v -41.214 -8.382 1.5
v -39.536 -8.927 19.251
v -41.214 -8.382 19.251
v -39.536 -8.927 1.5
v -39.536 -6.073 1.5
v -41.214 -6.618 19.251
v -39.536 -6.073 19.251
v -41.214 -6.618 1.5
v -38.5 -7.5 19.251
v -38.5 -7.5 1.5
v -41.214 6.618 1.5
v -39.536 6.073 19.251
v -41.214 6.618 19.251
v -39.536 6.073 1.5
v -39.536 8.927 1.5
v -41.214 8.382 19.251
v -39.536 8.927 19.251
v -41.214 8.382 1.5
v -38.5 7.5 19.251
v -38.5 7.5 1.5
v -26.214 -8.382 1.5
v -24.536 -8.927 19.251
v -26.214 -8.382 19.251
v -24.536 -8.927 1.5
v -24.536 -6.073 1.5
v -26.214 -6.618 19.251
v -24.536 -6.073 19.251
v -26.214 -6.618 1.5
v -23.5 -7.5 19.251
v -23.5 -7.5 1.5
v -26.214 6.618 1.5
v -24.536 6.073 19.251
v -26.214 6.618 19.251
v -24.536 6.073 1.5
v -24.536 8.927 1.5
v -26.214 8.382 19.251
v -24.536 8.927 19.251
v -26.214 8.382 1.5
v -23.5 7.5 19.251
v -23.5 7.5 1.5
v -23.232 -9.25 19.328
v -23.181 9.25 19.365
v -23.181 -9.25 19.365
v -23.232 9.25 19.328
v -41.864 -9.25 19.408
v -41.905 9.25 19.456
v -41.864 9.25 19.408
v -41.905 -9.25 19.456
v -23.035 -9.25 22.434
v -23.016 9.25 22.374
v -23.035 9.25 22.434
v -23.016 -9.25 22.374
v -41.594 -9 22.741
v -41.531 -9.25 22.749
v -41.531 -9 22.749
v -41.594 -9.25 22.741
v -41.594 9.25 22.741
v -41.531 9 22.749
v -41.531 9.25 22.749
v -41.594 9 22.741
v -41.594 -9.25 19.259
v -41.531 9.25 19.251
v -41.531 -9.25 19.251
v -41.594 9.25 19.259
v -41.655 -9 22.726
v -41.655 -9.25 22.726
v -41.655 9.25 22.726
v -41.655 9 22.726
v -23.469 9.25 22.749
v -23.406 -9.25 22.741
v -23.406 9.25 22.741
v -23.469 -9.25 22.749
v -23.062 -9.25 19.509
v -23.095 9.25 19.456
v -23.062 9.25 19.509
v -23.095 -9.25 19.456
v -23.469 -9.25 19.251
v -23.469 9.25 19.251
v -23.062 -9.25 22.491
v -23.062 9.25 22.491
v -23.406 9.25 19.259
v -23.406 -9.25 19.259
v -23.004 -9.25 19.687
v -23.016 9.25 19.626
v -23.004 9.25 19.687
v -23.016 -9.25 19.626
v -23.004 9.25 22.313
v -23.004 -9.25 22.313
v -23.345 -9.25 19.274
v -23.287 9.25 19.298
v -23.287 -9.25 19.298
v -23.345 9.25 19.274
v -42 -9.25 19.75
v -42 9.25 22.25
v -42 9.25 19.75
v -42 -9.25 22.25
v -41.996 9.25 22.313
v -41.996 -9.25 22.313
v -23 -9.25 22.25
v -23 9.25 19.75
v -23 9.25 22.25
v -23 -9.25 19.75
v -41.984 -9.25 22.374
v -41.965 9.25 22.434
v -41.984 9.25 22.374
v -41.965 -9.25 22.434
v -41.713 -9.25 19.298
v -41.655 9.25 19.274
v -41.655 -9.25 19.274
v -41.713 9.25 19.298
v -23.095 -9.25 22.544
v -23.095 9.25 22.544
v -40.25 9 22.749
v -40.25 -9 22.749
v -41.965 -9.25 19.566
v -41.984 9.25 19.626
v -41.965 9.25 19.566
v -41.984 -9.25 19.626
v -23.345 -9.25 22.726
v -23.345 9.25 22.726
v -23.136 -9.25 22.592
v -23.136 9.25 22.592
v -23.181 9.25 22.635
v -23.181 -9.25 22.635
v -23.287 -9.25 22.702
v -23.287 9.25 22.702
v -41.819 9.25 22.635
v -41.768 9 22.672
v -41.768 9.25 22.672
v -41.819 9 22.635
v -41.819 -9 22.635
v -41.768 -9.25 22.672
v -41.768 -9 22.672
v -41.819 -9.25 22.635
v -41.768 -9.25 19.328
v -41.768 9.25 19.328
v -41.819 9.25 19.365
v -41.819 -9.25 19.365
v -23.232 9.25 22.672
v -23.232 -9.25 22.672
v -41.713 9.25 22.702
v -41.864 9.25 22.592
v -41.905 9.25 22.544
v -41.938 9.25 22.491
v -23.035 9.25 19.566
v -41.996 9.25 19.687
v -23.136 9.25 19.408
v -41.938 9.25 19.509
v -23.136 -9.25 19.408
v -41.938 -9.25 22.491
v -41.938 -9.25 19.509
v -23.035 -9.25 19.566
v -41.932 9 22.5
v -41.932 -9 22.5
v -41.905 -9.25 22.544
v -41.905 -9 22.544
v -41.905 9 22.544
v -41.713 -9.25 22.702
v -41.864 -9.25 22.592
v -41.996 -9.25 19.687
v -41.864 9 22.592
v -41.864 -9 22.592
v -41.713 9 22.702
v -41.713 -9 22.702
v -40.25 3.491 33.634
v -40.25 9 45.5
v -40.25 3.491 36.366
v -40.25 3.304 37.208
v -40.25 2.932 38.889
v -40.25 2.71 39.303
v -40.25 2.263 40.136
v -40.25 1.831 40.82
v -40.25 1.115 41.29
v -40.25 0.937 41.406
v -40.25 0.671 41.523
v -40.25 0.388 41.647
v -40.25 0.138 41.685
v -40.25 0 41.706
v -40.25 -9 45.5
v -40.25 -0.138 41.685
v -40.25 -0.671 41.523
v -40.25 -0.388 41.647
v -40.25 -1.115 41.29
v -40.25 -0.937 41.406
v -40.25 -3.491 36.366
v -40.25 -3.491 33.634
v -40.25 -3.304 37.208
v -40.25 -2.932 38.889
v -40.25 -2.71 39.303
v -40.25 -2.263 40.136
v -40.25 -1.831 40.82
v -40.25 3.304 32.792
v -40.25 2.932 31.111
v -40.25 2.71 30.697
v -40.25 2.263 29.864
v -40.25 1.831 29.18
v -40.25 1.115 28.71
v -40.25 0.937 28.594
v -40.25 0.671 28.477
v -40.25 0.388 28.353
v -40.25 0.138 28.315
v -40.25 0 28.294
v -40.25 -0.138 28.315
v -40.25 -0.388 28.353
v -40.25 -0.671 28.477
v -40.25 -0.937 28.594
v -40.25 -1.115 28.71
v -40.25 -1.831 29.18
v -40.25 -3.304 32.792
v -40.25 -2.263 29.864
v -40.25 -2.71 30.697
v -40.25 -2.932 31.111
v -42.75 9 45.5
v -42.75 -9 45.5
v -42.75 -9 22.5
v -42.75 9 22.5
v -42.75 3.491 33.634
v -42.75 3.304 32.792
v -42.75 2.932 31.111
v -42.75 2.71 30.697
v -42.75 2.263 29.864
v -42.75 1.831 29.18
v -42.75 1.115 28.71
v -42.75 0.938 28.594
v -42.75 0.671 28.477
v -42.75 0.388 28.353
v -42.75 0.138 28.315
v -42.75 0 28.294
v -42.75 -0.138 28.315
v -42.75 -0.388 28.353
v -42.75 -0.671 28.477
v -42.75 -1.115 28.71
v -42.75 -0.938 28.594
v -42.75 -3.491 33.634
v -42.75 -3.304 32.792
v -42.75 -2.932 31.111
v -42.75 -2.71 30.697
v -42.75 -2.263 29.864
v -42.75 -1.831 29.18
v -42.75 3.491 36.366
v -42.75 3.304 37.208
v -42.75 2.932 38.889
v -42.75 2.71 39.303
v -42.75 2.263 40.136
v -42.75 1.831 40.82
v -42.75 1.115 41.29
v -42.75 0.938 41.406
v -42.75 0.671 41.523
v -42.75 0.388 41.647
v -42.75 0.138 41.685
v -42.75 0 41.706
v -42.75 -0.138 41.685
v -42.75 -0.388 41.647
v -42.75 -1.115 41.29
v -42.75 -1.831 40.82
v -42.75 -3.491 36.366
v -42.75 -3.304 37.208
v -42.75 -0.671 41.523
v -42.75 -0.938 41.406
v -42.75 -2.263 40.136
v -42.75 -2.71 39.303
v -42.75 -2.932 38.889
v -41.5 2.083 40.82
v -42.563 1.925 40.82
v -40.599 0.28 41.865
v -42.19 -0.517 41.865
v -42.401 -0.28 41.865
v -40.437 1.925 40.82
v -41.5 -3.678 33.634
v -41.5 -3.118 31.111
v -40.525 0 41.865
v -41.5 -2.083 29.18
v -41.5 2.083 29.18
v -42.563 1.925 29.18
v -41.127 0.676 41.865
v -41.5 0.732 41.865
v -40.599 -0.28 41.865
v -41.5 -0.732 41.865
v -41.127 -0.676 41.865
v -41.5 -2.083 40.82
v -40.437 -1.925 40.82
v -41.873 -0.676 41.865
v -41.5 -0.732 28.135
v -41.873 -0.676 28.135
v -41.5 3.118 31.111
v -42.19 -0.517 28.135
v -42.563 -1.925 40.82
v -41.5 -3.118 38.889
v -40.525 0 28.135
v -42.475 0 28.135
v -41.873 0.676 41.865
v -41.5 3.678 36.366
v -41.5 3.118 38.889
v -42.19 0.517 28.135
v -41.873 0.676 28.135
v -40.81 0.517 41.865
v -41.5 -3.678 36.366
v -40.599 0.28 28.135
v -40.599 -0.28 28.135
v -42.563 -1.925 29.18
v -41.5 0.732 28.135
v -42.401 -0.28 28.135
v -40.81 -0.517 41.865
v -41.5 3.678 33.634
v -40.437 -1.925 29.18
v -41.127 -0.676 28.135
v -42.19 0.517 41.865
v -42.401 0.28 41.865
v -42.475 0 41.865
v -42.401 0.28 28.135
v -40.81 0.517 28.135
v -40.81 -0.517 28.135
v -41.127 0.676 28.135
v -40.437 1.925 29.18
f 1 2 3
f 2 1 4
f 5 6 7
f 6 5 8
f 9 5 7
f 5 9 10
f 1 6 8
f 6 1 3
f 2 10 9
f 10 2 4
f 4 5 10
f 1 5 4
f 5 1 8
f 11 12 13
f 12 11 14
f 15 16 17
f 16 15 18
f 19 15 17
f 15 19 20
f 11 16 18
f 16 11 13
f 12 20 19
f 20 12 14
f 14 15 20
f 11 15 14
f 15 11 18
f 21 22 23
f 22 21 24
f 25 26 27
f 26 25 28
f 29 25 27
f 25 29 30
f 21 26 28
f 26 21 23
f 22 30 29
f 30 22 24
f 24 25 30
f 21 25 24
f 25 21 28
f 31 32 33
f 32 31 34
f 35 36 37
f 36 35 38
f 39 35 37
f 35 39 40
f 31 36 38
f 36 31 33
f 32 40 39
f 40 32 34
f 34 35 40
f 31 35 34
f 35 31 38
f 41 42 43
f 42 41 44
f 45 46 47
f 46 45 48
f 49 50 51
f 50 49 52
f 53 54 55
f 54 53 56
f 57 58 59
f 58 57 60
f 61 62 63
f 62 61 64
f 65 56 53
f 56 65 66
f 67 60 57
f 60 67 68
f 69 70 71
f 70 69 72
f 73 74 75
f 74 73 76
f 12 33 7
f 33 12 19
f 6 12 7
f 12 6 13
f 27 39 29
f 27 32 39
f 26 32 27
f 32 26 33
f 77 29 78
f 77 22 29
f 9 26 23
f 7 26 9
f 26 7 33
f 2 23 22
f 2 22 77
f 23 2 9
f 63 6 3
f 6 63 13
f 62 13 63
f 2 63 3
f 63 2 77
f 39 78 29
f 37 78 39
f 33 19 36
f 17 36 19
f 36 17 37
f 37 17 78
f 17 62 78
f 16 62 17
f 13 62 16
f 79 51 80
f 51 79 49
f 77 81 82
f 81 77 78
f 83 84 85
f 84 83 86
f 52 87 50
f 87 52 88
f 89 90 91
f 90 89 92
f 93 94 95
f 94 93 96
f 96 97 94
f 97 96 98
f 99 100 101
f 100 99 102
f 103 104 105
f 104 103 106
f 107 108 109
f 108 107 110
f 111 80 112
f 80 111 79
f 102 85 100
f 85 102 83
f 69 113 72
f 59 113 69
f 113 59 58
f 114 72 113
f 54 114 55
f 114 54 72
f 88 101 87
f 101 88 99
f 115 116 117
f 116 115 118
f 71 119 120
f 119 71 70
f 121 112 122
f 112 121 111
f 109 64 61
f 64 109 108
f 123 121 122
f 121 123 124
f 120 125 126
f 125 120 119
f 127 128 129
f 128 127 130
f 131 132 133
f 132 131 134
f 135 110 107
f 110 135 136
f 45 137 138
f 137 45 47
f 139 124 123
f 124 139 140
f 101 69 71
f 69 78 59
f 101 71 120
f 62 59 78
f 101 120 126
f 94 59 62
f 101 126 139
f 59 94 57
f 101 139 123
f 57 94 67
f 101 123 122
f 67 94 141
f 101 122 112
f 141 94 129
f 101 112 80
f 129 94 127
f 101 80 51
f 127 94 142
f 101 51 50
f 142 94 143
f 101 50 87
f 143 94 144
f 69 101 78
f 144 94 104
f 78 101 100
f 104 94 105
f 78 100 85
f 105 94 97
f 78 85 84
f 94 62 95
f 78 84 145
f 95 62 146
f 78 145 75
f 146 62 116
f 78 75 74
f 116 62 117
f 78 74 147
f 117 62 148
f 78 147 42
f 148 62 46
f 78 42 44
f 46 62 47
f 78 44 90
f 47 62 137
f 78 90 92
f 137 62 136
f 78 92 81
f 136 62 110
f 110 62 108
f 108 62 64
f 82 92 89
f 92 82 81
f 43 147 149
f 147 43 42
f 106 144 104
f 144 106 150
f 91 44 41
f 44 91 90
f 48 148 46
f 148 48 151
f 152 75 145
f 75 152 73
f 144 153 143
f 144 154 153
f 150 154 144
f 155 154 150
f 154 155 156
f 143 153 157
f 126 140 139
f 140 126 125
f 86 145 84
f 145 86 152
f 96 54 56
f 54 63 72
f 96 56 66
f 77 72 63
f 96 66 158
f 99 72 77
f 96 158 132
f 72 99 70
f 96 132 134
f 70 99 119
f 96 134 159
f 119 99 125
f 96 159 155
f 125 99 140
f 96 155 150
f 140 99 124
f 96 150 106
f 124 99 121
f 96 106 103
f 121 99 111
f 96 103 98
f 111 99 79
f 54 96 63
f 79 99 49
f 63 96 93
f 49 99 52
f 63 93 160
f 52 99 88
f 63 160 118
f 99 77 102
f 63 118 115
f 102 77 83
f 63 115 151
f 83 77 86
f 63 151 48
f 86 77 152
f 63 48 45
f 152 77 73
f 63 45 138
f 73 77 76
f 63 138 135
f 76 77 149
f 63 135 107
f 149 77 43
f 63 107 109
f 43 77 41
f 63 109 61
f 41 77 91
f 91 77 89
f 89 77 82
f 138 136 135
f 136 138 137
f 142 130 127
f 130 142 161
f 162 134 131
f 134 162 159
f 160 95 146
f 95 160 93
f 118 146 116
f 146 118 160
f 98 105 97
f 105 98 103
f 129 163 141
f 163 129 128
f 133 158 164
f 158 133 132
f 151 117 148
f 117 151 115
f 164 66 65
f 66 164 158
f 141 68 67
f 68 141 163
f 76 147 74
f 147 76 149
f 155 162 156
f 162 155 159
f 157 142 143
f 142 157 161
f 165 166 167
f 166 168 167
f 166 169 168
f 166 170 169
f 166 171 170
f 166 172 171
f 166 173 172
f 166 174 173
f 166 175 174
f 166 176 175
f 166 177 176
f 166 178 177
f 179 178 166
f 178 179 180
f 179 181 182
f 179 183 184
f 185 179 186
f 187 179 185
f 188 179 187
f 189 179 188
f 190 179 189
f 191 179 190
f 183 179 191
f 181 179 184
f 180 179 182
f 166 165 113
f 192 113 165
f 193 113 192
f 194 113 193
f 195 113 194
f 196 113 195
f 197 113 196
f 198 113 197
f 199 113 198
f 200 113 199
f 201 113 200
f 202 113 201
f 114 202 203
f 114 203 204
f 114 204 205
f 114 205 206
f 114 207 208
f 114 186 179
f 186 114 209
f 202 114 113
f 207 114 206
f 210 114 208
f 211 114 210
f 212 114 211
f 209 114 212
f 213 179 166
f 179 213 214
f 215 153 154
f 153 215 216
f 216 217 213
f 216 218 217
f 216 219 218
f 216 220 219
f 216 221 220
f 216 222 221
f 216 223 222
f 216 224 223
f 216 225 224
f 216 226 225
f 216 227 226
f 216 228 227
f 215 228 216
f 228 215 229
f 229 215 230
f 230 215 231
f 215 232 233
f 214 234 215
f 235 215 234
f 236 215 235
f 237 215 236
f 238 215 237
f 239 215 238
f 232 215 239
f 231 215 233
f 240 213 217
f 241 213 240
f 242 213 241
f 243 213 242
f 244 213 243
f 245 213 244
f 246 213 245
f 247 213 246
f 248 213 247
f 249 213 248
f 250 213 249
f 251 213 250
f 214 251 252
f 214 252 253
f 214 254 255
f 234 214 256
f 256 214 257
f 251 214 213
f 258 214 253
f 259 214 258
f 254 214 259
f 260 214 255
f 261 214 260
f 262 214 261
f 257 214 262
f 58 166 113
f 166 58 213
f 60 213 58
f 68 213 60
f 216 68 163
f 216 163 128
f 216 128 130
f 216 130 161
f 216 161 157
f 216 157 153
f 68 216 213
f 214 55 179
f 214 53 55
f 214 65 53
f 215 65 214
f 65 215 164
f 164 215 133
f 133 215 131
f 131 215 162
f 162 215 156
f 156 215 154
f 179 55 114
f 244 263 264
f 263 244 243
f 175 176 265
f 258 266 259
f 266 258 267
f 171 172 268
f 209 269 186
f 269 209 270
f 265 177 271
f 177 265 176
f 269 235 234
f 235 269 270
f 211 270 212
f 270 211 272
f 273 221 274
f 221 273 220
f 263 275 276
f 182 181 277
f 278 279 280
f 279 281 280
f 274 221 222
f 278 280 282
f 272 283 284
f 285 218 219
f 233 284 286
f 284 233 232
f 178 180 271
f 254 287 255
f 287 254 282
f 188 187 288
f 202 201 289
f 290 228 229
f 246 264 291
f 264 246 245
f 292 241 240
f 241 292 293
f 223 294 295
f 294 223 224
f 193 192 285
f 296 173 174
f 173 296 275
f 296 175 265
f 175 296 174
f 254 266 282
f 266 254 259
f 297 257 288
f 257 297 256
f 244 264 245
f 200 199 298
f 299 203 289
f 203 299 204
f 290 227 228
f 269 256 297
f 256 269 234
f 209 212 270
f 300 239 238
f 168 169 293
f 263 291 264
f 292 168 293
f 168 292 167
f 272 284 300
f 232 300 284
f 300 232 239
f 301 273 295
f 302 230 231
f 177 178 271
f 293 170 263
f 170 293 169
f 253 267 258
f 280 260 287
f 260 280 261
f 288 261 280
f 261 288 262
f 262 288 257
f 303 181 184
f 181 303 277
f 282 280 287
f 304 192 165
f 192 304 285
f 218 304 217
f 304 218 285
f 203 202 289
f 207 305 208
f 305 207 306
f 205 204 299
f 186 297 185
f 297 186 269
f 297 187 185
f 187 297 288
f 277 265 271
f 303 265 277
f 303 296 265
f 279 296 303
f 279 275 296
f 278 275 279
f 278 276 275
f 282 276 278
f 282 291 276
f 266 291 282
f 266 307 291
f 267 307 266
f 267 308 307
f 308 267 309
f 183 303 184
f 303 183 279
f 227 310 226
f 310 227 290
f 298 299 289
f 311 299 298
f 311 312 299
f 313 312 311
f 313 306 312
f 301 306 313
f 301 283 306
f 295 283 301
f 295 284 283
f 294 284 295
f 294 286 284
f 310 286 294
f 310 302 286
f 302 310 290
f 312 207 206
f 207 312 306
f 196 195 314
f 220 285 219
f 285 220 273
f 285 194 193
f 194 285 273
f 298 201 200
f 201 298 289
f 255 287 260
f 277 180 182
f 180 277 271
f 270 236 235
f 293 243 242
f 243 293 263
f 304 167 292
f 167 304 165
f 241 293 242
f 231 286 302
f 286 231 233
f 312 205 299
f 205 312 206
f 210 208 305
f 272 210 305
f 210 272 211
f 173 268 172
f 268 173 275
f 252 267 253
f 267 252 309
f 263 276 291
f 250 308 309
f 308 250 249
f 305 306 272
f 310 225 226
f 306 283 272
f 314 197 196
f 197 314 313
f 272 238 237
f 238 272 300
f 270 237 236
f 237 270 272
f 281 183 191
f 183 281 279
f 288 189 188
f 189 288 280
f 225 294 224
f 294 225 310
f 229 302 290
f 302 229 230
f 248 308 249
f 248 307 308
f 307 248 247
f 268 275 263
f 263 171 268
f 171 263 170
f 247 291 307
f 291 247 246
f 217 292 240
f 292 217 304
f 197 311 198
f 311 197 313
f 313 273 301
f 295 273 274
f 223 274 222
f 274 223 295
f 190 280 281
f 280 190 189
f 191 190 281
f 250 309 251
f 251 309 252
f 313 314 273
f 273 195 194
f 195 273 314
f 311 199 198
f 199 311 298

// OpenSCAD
module piso()
{
    cube([100,100,3], center=true);
}

module pisoexpandido()
{
    scale([5,5,1])piso();
}


module mesa()
{
    //30 pulgadas es el tamano normal de un mesa
    //primer pierna
    translate([-20,-20,1.5])cylinder(h=30,r=1.5);
    //segunda pierna
    translate([-20,20,1.5])cylinder(h=30,r=1.5);
    //tercera pierna
    translate([20,-20,1.5])cylinder(h=30,r=1.5);
    //cuarta pierna
    translate([20,20,1.5])cylinder(h=30,r=1.5);
    
    //tapa de la mesa
    //altura mitad piso(z) + mitad mesa(z) + altura pata
    translate([0,0,33])cube([45,45,3],center=true);
}

module conjuntodemesas(cantidad =3)
{
    for(z =[0:cantidad])
    {
    translate([150,-200 + 120 *z,0])scale([1,2,1])mesa();
    }
}

module sillasparalasmesas(cantidad = 3)
{
    for(z=[0:cantidad])
    {
    translate([150,-200+120*z,0]) mirror([1,0,0])silla();
    }
}


module filadesillas(cantidad =7)
{
    for(z=[0:cantidad])
    {
        translate([50,-160+40*z,0])color("Blue",1)silla();
    }
}

module sillasaudiencia(cantidad =2)
{
    for(z=[0:cantidad])
    {
        translate([-50*z,0,0])filadesillas();
    }
}





module sillaBase()
{
    translate([-40,-7.5,1.5])cylinder(h=18,r=1.5);
    
    translate([-40,7.5,1.5])cylinder(h=18,r=1.5);
    
    translate([-25,-7.5,1.5])cylinder(h=18,r=1.5);
    
    translate([-25,7.5,1.5])cylinder(h=18,r=1.5);
    
    //altura mitad piso(z) + mitad mesa(z) + altura pata
    translate([-32.5,0,21])minkowski()
    {
        cube([18,18,2.5],center=true);
        rotate([90,0,0])cylinder(h=0.5, r=0.5, center=true,$fn=50);
    }
}

module espaldar()
{
    difference(){
    translate([-41.5,0,34])cube([2.5,18,23],center=true);
    translate([-41.5,0,35])scale([1,.75,1.4])sphere(5);     
    }
}

module silla()
{
        sillaBase();
        espaldar();
}

silla();
